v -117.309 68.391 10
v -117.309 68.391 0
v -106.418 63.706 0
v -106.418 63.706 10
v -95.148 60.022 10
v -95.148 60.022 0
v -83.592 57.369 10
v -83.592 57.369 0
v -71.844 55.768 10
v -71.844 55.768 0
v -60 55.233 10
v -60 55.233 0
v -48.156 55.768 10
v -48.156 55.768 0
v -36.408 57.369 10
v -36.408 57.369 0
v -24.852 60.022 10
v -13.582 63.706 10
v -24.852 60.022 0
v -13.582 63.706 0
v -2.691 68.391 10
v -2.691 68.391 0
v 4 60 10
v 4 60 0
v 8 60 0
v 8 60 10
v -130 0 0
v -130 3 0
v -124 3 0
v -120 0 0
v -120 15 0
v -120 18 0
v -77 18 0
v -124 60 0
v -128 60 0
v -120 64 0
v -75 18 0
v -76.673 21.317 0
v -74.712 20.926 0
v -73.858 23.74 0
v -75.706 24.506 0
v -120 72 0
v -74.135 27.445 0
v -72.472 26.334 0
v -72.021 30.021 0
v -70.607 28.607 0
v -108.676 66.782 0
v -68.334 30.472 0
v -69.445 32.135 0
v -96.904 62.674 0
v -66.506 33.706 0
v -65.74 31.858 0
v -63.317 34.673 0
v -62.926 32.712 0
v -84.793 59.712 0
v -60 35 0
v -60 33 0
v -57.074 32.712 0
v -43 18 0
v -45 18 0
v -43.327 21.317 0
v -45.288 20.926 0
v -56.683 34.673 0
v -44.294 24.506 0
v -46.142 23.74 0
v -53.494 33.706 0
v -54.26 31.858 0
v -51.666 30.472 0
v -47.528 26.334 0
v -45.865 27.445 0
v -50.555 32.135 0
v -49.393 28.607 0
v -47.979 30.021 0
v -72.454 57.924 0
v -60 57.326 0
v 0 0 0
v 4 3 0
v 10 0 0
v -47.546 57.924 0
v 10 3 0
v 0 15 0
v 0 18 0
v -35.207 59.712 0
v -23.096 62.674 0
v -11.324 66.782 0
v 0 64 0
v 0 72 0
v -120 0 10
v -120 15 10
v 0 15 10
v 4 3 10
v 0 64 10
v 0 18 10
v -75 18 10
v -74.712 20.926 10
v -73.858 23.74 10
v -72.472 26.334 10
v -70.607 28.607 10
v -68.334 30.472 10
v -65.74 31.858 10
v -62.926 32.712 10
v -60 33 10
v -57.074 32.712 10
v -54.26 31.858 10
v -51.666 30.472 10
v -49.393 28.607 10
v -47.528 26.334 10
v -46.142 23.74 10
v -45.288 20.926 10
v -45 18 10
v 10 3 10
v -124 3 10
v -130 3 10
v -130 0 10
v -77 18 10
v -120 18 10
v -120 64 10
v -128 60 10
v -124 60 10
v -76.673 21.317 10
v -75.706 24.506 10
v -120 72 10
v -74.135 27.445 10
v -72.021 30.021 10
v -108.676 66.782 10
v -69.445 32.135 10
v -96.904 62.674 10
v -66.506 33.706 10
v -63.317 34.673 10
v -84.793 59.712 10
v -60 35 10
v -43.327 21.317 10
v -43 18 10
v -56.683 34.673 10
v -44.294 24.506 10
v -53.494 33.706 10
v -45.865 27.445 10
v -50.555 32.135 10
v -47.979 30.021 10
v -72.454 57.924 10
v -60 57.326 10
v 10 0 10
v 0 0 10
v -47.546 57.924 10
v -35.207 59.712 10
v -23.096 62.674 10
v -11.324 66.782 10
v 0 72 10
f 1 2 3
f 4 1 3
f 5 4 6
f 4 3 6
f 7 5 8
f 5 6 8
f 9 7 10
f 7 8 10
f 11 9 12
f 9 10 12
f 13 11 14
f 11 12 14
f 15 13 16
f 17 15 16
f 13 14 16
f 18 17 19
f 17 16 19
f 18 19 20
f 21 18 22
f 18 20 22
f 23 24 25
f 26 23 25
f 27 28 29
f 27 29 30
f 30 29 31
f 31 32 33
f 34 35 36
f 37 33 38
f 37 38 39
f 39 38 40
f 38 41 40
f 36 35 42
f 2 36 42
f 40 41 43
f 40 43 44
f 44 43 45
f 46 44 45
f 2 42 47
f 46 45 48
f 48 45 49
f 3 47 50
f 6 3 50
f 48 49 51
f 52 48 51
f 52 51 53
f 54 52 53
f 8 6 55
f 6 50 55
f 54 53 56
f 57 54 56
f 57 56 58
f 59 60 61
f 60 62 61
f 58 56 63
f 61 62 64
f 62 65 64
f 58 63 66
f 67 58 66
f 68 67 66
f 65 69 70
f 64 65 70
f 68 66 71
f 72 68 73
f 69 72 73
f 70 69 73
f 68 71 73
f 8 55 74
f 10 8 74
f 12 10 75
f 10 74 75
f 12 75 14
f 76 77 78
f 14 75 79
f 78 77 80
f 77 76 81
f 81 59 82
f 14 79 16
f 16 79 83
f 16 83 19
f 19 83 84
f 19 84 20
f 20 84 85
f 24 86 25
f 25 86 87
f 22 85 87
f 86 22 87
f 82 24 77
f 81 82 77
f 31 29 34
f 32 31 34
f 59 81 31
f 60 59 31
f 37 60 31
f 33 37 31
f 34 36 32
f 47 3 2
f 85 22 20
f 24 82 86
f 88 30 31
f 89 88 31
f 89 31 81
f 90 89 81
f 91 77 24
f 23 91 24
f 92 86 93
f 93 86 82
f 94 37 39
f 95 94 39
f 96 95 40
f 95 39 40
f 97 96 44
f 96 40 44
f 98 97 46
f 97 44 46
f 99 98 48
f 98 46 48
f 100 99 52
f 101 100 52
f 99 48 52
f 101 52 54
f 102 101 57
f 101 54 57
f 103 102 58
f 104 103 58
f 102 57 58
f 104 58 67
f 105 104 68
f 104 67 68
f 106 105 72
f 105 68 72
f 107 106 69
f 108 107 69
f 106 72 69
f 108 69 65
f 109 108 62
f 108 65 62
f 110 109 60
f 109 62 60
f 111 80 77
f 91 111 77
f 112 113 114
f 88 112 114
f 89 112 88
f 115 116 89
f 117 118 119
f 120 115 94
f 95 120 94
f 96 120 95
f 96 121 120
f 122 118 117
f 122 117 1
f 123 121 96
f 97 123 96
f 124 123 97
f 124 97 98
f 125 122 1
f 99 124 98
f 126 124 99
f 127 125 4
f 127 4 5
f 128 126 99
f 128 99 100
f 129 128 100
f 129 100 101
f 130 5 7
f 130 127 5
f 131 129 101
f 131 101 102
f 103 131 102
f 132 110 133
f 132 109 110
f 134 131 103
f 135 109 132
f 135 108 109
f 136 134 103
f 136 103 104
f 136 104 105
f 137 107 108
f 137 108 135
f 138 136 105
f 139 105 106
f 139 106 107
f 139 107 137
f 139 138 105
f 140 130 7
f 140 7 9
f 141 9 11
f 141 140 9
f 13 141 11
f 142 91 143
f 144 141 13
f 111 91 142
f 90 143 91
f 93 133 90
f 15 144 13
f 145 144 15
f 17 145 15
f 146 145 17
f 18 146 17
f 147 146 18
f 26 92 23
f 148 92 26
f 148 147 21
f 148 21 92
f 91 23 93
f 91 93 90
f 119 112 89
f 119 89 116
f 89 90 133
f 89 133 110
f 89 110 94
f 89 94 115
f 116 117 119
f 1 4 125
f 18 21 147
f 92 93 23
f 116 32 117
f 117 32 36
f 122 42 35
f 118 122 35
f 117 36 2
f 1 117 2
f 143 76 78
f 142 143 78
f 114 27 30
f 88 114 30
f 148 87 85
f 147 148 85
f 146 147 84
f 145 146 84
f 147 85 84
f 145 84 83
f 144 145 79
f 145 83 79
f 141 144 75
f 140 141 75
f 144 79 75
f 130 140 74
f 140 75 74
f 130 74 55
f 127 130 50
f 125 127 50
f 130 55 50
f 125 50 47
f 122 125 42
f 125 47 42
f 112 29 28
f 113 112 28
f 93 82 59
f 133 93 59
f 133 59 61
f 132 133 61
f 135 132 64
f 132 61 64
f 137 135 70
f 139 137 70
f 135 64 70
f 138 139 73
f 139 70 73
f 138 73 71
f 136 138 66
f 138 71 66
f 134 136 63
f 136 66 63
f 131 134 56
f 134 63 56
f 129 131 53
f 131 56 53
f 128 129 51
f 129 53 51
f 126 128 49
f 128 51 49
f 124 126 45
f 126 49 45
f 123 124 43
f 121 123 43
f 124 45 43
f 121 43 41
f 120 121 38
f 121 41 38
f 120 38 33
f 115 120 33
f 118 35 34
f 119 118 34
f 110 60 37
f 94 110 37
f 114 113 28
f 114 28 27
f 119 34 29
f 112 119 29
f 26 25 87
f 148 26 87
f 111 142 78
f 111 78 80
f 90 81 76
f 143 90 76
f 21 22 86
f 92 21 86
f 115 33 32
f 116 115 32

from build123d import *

# Parameters (mm, degrees)
F1_DEPTH = 10


with BuildPart() as f1:
    # F0 (on Top) → F1 (new body)
    with BuildSketch(Plane.XY):
        with BuildLine():
            Line((0, 15), (0, 0))
            Line((0, 0), (10, 0))
            Line((10, 0), (10, 3))
            Line((10, 3), (4, 3))
            Line((4, 3), (4, 60))
            Line((4, 60), (8, 60))
            Line((8, 60), (0, 72))
            ThreePointArc((0, 72), (-60, 57.325626), (-120, 72))
            Line((-120, 72), (-128, 60))
            Line((-128, 60), (-124, 60))
            Line((-124, 60), (-124, 3))
            Line((-124, 3), (-130, 3))
            Line((-130, 3), (-130, 0))
            Line((-130, 0), (-120, 0))
            Line((-120, 0), (-120, 15))
            Line((-120, 15), (-120, 18))
            Line((-120, 18), (-120, 60))
            Line((-120, 60), (-120, 64))
            Line((-120, 64), (-117.309005, 68.39129))
            ThreePointArc((-117.309005, 68.39129), (-60, 55.232971), (-2.690995, 68.39129))
            Line((-2.690995, 68.39129), (0, 64))
            Line((0, 64), (0, 60))
            Line((0, 60), (0, 18))
            Line((0, 18), (0, 15))
        make_face()
        Polygon((-120, 15), (0, 15), (0, 18), (-43, 18), (-45, 18), (-75, 18), (-77, 18), (-120, 18), align=None)
        with BuildLine():
            Line((-45, 18), (-43, 18))
            ThreePointArc((-43, 18), (-60, 35), (-77, 18))
            Line((-77, 18), (-75, 18))
            ThreePointArc((-75, 18), (-60, 33), (-45, 18))
        make_face()
    extrude(amount=F1_DEPTH)


solid = f1.part
